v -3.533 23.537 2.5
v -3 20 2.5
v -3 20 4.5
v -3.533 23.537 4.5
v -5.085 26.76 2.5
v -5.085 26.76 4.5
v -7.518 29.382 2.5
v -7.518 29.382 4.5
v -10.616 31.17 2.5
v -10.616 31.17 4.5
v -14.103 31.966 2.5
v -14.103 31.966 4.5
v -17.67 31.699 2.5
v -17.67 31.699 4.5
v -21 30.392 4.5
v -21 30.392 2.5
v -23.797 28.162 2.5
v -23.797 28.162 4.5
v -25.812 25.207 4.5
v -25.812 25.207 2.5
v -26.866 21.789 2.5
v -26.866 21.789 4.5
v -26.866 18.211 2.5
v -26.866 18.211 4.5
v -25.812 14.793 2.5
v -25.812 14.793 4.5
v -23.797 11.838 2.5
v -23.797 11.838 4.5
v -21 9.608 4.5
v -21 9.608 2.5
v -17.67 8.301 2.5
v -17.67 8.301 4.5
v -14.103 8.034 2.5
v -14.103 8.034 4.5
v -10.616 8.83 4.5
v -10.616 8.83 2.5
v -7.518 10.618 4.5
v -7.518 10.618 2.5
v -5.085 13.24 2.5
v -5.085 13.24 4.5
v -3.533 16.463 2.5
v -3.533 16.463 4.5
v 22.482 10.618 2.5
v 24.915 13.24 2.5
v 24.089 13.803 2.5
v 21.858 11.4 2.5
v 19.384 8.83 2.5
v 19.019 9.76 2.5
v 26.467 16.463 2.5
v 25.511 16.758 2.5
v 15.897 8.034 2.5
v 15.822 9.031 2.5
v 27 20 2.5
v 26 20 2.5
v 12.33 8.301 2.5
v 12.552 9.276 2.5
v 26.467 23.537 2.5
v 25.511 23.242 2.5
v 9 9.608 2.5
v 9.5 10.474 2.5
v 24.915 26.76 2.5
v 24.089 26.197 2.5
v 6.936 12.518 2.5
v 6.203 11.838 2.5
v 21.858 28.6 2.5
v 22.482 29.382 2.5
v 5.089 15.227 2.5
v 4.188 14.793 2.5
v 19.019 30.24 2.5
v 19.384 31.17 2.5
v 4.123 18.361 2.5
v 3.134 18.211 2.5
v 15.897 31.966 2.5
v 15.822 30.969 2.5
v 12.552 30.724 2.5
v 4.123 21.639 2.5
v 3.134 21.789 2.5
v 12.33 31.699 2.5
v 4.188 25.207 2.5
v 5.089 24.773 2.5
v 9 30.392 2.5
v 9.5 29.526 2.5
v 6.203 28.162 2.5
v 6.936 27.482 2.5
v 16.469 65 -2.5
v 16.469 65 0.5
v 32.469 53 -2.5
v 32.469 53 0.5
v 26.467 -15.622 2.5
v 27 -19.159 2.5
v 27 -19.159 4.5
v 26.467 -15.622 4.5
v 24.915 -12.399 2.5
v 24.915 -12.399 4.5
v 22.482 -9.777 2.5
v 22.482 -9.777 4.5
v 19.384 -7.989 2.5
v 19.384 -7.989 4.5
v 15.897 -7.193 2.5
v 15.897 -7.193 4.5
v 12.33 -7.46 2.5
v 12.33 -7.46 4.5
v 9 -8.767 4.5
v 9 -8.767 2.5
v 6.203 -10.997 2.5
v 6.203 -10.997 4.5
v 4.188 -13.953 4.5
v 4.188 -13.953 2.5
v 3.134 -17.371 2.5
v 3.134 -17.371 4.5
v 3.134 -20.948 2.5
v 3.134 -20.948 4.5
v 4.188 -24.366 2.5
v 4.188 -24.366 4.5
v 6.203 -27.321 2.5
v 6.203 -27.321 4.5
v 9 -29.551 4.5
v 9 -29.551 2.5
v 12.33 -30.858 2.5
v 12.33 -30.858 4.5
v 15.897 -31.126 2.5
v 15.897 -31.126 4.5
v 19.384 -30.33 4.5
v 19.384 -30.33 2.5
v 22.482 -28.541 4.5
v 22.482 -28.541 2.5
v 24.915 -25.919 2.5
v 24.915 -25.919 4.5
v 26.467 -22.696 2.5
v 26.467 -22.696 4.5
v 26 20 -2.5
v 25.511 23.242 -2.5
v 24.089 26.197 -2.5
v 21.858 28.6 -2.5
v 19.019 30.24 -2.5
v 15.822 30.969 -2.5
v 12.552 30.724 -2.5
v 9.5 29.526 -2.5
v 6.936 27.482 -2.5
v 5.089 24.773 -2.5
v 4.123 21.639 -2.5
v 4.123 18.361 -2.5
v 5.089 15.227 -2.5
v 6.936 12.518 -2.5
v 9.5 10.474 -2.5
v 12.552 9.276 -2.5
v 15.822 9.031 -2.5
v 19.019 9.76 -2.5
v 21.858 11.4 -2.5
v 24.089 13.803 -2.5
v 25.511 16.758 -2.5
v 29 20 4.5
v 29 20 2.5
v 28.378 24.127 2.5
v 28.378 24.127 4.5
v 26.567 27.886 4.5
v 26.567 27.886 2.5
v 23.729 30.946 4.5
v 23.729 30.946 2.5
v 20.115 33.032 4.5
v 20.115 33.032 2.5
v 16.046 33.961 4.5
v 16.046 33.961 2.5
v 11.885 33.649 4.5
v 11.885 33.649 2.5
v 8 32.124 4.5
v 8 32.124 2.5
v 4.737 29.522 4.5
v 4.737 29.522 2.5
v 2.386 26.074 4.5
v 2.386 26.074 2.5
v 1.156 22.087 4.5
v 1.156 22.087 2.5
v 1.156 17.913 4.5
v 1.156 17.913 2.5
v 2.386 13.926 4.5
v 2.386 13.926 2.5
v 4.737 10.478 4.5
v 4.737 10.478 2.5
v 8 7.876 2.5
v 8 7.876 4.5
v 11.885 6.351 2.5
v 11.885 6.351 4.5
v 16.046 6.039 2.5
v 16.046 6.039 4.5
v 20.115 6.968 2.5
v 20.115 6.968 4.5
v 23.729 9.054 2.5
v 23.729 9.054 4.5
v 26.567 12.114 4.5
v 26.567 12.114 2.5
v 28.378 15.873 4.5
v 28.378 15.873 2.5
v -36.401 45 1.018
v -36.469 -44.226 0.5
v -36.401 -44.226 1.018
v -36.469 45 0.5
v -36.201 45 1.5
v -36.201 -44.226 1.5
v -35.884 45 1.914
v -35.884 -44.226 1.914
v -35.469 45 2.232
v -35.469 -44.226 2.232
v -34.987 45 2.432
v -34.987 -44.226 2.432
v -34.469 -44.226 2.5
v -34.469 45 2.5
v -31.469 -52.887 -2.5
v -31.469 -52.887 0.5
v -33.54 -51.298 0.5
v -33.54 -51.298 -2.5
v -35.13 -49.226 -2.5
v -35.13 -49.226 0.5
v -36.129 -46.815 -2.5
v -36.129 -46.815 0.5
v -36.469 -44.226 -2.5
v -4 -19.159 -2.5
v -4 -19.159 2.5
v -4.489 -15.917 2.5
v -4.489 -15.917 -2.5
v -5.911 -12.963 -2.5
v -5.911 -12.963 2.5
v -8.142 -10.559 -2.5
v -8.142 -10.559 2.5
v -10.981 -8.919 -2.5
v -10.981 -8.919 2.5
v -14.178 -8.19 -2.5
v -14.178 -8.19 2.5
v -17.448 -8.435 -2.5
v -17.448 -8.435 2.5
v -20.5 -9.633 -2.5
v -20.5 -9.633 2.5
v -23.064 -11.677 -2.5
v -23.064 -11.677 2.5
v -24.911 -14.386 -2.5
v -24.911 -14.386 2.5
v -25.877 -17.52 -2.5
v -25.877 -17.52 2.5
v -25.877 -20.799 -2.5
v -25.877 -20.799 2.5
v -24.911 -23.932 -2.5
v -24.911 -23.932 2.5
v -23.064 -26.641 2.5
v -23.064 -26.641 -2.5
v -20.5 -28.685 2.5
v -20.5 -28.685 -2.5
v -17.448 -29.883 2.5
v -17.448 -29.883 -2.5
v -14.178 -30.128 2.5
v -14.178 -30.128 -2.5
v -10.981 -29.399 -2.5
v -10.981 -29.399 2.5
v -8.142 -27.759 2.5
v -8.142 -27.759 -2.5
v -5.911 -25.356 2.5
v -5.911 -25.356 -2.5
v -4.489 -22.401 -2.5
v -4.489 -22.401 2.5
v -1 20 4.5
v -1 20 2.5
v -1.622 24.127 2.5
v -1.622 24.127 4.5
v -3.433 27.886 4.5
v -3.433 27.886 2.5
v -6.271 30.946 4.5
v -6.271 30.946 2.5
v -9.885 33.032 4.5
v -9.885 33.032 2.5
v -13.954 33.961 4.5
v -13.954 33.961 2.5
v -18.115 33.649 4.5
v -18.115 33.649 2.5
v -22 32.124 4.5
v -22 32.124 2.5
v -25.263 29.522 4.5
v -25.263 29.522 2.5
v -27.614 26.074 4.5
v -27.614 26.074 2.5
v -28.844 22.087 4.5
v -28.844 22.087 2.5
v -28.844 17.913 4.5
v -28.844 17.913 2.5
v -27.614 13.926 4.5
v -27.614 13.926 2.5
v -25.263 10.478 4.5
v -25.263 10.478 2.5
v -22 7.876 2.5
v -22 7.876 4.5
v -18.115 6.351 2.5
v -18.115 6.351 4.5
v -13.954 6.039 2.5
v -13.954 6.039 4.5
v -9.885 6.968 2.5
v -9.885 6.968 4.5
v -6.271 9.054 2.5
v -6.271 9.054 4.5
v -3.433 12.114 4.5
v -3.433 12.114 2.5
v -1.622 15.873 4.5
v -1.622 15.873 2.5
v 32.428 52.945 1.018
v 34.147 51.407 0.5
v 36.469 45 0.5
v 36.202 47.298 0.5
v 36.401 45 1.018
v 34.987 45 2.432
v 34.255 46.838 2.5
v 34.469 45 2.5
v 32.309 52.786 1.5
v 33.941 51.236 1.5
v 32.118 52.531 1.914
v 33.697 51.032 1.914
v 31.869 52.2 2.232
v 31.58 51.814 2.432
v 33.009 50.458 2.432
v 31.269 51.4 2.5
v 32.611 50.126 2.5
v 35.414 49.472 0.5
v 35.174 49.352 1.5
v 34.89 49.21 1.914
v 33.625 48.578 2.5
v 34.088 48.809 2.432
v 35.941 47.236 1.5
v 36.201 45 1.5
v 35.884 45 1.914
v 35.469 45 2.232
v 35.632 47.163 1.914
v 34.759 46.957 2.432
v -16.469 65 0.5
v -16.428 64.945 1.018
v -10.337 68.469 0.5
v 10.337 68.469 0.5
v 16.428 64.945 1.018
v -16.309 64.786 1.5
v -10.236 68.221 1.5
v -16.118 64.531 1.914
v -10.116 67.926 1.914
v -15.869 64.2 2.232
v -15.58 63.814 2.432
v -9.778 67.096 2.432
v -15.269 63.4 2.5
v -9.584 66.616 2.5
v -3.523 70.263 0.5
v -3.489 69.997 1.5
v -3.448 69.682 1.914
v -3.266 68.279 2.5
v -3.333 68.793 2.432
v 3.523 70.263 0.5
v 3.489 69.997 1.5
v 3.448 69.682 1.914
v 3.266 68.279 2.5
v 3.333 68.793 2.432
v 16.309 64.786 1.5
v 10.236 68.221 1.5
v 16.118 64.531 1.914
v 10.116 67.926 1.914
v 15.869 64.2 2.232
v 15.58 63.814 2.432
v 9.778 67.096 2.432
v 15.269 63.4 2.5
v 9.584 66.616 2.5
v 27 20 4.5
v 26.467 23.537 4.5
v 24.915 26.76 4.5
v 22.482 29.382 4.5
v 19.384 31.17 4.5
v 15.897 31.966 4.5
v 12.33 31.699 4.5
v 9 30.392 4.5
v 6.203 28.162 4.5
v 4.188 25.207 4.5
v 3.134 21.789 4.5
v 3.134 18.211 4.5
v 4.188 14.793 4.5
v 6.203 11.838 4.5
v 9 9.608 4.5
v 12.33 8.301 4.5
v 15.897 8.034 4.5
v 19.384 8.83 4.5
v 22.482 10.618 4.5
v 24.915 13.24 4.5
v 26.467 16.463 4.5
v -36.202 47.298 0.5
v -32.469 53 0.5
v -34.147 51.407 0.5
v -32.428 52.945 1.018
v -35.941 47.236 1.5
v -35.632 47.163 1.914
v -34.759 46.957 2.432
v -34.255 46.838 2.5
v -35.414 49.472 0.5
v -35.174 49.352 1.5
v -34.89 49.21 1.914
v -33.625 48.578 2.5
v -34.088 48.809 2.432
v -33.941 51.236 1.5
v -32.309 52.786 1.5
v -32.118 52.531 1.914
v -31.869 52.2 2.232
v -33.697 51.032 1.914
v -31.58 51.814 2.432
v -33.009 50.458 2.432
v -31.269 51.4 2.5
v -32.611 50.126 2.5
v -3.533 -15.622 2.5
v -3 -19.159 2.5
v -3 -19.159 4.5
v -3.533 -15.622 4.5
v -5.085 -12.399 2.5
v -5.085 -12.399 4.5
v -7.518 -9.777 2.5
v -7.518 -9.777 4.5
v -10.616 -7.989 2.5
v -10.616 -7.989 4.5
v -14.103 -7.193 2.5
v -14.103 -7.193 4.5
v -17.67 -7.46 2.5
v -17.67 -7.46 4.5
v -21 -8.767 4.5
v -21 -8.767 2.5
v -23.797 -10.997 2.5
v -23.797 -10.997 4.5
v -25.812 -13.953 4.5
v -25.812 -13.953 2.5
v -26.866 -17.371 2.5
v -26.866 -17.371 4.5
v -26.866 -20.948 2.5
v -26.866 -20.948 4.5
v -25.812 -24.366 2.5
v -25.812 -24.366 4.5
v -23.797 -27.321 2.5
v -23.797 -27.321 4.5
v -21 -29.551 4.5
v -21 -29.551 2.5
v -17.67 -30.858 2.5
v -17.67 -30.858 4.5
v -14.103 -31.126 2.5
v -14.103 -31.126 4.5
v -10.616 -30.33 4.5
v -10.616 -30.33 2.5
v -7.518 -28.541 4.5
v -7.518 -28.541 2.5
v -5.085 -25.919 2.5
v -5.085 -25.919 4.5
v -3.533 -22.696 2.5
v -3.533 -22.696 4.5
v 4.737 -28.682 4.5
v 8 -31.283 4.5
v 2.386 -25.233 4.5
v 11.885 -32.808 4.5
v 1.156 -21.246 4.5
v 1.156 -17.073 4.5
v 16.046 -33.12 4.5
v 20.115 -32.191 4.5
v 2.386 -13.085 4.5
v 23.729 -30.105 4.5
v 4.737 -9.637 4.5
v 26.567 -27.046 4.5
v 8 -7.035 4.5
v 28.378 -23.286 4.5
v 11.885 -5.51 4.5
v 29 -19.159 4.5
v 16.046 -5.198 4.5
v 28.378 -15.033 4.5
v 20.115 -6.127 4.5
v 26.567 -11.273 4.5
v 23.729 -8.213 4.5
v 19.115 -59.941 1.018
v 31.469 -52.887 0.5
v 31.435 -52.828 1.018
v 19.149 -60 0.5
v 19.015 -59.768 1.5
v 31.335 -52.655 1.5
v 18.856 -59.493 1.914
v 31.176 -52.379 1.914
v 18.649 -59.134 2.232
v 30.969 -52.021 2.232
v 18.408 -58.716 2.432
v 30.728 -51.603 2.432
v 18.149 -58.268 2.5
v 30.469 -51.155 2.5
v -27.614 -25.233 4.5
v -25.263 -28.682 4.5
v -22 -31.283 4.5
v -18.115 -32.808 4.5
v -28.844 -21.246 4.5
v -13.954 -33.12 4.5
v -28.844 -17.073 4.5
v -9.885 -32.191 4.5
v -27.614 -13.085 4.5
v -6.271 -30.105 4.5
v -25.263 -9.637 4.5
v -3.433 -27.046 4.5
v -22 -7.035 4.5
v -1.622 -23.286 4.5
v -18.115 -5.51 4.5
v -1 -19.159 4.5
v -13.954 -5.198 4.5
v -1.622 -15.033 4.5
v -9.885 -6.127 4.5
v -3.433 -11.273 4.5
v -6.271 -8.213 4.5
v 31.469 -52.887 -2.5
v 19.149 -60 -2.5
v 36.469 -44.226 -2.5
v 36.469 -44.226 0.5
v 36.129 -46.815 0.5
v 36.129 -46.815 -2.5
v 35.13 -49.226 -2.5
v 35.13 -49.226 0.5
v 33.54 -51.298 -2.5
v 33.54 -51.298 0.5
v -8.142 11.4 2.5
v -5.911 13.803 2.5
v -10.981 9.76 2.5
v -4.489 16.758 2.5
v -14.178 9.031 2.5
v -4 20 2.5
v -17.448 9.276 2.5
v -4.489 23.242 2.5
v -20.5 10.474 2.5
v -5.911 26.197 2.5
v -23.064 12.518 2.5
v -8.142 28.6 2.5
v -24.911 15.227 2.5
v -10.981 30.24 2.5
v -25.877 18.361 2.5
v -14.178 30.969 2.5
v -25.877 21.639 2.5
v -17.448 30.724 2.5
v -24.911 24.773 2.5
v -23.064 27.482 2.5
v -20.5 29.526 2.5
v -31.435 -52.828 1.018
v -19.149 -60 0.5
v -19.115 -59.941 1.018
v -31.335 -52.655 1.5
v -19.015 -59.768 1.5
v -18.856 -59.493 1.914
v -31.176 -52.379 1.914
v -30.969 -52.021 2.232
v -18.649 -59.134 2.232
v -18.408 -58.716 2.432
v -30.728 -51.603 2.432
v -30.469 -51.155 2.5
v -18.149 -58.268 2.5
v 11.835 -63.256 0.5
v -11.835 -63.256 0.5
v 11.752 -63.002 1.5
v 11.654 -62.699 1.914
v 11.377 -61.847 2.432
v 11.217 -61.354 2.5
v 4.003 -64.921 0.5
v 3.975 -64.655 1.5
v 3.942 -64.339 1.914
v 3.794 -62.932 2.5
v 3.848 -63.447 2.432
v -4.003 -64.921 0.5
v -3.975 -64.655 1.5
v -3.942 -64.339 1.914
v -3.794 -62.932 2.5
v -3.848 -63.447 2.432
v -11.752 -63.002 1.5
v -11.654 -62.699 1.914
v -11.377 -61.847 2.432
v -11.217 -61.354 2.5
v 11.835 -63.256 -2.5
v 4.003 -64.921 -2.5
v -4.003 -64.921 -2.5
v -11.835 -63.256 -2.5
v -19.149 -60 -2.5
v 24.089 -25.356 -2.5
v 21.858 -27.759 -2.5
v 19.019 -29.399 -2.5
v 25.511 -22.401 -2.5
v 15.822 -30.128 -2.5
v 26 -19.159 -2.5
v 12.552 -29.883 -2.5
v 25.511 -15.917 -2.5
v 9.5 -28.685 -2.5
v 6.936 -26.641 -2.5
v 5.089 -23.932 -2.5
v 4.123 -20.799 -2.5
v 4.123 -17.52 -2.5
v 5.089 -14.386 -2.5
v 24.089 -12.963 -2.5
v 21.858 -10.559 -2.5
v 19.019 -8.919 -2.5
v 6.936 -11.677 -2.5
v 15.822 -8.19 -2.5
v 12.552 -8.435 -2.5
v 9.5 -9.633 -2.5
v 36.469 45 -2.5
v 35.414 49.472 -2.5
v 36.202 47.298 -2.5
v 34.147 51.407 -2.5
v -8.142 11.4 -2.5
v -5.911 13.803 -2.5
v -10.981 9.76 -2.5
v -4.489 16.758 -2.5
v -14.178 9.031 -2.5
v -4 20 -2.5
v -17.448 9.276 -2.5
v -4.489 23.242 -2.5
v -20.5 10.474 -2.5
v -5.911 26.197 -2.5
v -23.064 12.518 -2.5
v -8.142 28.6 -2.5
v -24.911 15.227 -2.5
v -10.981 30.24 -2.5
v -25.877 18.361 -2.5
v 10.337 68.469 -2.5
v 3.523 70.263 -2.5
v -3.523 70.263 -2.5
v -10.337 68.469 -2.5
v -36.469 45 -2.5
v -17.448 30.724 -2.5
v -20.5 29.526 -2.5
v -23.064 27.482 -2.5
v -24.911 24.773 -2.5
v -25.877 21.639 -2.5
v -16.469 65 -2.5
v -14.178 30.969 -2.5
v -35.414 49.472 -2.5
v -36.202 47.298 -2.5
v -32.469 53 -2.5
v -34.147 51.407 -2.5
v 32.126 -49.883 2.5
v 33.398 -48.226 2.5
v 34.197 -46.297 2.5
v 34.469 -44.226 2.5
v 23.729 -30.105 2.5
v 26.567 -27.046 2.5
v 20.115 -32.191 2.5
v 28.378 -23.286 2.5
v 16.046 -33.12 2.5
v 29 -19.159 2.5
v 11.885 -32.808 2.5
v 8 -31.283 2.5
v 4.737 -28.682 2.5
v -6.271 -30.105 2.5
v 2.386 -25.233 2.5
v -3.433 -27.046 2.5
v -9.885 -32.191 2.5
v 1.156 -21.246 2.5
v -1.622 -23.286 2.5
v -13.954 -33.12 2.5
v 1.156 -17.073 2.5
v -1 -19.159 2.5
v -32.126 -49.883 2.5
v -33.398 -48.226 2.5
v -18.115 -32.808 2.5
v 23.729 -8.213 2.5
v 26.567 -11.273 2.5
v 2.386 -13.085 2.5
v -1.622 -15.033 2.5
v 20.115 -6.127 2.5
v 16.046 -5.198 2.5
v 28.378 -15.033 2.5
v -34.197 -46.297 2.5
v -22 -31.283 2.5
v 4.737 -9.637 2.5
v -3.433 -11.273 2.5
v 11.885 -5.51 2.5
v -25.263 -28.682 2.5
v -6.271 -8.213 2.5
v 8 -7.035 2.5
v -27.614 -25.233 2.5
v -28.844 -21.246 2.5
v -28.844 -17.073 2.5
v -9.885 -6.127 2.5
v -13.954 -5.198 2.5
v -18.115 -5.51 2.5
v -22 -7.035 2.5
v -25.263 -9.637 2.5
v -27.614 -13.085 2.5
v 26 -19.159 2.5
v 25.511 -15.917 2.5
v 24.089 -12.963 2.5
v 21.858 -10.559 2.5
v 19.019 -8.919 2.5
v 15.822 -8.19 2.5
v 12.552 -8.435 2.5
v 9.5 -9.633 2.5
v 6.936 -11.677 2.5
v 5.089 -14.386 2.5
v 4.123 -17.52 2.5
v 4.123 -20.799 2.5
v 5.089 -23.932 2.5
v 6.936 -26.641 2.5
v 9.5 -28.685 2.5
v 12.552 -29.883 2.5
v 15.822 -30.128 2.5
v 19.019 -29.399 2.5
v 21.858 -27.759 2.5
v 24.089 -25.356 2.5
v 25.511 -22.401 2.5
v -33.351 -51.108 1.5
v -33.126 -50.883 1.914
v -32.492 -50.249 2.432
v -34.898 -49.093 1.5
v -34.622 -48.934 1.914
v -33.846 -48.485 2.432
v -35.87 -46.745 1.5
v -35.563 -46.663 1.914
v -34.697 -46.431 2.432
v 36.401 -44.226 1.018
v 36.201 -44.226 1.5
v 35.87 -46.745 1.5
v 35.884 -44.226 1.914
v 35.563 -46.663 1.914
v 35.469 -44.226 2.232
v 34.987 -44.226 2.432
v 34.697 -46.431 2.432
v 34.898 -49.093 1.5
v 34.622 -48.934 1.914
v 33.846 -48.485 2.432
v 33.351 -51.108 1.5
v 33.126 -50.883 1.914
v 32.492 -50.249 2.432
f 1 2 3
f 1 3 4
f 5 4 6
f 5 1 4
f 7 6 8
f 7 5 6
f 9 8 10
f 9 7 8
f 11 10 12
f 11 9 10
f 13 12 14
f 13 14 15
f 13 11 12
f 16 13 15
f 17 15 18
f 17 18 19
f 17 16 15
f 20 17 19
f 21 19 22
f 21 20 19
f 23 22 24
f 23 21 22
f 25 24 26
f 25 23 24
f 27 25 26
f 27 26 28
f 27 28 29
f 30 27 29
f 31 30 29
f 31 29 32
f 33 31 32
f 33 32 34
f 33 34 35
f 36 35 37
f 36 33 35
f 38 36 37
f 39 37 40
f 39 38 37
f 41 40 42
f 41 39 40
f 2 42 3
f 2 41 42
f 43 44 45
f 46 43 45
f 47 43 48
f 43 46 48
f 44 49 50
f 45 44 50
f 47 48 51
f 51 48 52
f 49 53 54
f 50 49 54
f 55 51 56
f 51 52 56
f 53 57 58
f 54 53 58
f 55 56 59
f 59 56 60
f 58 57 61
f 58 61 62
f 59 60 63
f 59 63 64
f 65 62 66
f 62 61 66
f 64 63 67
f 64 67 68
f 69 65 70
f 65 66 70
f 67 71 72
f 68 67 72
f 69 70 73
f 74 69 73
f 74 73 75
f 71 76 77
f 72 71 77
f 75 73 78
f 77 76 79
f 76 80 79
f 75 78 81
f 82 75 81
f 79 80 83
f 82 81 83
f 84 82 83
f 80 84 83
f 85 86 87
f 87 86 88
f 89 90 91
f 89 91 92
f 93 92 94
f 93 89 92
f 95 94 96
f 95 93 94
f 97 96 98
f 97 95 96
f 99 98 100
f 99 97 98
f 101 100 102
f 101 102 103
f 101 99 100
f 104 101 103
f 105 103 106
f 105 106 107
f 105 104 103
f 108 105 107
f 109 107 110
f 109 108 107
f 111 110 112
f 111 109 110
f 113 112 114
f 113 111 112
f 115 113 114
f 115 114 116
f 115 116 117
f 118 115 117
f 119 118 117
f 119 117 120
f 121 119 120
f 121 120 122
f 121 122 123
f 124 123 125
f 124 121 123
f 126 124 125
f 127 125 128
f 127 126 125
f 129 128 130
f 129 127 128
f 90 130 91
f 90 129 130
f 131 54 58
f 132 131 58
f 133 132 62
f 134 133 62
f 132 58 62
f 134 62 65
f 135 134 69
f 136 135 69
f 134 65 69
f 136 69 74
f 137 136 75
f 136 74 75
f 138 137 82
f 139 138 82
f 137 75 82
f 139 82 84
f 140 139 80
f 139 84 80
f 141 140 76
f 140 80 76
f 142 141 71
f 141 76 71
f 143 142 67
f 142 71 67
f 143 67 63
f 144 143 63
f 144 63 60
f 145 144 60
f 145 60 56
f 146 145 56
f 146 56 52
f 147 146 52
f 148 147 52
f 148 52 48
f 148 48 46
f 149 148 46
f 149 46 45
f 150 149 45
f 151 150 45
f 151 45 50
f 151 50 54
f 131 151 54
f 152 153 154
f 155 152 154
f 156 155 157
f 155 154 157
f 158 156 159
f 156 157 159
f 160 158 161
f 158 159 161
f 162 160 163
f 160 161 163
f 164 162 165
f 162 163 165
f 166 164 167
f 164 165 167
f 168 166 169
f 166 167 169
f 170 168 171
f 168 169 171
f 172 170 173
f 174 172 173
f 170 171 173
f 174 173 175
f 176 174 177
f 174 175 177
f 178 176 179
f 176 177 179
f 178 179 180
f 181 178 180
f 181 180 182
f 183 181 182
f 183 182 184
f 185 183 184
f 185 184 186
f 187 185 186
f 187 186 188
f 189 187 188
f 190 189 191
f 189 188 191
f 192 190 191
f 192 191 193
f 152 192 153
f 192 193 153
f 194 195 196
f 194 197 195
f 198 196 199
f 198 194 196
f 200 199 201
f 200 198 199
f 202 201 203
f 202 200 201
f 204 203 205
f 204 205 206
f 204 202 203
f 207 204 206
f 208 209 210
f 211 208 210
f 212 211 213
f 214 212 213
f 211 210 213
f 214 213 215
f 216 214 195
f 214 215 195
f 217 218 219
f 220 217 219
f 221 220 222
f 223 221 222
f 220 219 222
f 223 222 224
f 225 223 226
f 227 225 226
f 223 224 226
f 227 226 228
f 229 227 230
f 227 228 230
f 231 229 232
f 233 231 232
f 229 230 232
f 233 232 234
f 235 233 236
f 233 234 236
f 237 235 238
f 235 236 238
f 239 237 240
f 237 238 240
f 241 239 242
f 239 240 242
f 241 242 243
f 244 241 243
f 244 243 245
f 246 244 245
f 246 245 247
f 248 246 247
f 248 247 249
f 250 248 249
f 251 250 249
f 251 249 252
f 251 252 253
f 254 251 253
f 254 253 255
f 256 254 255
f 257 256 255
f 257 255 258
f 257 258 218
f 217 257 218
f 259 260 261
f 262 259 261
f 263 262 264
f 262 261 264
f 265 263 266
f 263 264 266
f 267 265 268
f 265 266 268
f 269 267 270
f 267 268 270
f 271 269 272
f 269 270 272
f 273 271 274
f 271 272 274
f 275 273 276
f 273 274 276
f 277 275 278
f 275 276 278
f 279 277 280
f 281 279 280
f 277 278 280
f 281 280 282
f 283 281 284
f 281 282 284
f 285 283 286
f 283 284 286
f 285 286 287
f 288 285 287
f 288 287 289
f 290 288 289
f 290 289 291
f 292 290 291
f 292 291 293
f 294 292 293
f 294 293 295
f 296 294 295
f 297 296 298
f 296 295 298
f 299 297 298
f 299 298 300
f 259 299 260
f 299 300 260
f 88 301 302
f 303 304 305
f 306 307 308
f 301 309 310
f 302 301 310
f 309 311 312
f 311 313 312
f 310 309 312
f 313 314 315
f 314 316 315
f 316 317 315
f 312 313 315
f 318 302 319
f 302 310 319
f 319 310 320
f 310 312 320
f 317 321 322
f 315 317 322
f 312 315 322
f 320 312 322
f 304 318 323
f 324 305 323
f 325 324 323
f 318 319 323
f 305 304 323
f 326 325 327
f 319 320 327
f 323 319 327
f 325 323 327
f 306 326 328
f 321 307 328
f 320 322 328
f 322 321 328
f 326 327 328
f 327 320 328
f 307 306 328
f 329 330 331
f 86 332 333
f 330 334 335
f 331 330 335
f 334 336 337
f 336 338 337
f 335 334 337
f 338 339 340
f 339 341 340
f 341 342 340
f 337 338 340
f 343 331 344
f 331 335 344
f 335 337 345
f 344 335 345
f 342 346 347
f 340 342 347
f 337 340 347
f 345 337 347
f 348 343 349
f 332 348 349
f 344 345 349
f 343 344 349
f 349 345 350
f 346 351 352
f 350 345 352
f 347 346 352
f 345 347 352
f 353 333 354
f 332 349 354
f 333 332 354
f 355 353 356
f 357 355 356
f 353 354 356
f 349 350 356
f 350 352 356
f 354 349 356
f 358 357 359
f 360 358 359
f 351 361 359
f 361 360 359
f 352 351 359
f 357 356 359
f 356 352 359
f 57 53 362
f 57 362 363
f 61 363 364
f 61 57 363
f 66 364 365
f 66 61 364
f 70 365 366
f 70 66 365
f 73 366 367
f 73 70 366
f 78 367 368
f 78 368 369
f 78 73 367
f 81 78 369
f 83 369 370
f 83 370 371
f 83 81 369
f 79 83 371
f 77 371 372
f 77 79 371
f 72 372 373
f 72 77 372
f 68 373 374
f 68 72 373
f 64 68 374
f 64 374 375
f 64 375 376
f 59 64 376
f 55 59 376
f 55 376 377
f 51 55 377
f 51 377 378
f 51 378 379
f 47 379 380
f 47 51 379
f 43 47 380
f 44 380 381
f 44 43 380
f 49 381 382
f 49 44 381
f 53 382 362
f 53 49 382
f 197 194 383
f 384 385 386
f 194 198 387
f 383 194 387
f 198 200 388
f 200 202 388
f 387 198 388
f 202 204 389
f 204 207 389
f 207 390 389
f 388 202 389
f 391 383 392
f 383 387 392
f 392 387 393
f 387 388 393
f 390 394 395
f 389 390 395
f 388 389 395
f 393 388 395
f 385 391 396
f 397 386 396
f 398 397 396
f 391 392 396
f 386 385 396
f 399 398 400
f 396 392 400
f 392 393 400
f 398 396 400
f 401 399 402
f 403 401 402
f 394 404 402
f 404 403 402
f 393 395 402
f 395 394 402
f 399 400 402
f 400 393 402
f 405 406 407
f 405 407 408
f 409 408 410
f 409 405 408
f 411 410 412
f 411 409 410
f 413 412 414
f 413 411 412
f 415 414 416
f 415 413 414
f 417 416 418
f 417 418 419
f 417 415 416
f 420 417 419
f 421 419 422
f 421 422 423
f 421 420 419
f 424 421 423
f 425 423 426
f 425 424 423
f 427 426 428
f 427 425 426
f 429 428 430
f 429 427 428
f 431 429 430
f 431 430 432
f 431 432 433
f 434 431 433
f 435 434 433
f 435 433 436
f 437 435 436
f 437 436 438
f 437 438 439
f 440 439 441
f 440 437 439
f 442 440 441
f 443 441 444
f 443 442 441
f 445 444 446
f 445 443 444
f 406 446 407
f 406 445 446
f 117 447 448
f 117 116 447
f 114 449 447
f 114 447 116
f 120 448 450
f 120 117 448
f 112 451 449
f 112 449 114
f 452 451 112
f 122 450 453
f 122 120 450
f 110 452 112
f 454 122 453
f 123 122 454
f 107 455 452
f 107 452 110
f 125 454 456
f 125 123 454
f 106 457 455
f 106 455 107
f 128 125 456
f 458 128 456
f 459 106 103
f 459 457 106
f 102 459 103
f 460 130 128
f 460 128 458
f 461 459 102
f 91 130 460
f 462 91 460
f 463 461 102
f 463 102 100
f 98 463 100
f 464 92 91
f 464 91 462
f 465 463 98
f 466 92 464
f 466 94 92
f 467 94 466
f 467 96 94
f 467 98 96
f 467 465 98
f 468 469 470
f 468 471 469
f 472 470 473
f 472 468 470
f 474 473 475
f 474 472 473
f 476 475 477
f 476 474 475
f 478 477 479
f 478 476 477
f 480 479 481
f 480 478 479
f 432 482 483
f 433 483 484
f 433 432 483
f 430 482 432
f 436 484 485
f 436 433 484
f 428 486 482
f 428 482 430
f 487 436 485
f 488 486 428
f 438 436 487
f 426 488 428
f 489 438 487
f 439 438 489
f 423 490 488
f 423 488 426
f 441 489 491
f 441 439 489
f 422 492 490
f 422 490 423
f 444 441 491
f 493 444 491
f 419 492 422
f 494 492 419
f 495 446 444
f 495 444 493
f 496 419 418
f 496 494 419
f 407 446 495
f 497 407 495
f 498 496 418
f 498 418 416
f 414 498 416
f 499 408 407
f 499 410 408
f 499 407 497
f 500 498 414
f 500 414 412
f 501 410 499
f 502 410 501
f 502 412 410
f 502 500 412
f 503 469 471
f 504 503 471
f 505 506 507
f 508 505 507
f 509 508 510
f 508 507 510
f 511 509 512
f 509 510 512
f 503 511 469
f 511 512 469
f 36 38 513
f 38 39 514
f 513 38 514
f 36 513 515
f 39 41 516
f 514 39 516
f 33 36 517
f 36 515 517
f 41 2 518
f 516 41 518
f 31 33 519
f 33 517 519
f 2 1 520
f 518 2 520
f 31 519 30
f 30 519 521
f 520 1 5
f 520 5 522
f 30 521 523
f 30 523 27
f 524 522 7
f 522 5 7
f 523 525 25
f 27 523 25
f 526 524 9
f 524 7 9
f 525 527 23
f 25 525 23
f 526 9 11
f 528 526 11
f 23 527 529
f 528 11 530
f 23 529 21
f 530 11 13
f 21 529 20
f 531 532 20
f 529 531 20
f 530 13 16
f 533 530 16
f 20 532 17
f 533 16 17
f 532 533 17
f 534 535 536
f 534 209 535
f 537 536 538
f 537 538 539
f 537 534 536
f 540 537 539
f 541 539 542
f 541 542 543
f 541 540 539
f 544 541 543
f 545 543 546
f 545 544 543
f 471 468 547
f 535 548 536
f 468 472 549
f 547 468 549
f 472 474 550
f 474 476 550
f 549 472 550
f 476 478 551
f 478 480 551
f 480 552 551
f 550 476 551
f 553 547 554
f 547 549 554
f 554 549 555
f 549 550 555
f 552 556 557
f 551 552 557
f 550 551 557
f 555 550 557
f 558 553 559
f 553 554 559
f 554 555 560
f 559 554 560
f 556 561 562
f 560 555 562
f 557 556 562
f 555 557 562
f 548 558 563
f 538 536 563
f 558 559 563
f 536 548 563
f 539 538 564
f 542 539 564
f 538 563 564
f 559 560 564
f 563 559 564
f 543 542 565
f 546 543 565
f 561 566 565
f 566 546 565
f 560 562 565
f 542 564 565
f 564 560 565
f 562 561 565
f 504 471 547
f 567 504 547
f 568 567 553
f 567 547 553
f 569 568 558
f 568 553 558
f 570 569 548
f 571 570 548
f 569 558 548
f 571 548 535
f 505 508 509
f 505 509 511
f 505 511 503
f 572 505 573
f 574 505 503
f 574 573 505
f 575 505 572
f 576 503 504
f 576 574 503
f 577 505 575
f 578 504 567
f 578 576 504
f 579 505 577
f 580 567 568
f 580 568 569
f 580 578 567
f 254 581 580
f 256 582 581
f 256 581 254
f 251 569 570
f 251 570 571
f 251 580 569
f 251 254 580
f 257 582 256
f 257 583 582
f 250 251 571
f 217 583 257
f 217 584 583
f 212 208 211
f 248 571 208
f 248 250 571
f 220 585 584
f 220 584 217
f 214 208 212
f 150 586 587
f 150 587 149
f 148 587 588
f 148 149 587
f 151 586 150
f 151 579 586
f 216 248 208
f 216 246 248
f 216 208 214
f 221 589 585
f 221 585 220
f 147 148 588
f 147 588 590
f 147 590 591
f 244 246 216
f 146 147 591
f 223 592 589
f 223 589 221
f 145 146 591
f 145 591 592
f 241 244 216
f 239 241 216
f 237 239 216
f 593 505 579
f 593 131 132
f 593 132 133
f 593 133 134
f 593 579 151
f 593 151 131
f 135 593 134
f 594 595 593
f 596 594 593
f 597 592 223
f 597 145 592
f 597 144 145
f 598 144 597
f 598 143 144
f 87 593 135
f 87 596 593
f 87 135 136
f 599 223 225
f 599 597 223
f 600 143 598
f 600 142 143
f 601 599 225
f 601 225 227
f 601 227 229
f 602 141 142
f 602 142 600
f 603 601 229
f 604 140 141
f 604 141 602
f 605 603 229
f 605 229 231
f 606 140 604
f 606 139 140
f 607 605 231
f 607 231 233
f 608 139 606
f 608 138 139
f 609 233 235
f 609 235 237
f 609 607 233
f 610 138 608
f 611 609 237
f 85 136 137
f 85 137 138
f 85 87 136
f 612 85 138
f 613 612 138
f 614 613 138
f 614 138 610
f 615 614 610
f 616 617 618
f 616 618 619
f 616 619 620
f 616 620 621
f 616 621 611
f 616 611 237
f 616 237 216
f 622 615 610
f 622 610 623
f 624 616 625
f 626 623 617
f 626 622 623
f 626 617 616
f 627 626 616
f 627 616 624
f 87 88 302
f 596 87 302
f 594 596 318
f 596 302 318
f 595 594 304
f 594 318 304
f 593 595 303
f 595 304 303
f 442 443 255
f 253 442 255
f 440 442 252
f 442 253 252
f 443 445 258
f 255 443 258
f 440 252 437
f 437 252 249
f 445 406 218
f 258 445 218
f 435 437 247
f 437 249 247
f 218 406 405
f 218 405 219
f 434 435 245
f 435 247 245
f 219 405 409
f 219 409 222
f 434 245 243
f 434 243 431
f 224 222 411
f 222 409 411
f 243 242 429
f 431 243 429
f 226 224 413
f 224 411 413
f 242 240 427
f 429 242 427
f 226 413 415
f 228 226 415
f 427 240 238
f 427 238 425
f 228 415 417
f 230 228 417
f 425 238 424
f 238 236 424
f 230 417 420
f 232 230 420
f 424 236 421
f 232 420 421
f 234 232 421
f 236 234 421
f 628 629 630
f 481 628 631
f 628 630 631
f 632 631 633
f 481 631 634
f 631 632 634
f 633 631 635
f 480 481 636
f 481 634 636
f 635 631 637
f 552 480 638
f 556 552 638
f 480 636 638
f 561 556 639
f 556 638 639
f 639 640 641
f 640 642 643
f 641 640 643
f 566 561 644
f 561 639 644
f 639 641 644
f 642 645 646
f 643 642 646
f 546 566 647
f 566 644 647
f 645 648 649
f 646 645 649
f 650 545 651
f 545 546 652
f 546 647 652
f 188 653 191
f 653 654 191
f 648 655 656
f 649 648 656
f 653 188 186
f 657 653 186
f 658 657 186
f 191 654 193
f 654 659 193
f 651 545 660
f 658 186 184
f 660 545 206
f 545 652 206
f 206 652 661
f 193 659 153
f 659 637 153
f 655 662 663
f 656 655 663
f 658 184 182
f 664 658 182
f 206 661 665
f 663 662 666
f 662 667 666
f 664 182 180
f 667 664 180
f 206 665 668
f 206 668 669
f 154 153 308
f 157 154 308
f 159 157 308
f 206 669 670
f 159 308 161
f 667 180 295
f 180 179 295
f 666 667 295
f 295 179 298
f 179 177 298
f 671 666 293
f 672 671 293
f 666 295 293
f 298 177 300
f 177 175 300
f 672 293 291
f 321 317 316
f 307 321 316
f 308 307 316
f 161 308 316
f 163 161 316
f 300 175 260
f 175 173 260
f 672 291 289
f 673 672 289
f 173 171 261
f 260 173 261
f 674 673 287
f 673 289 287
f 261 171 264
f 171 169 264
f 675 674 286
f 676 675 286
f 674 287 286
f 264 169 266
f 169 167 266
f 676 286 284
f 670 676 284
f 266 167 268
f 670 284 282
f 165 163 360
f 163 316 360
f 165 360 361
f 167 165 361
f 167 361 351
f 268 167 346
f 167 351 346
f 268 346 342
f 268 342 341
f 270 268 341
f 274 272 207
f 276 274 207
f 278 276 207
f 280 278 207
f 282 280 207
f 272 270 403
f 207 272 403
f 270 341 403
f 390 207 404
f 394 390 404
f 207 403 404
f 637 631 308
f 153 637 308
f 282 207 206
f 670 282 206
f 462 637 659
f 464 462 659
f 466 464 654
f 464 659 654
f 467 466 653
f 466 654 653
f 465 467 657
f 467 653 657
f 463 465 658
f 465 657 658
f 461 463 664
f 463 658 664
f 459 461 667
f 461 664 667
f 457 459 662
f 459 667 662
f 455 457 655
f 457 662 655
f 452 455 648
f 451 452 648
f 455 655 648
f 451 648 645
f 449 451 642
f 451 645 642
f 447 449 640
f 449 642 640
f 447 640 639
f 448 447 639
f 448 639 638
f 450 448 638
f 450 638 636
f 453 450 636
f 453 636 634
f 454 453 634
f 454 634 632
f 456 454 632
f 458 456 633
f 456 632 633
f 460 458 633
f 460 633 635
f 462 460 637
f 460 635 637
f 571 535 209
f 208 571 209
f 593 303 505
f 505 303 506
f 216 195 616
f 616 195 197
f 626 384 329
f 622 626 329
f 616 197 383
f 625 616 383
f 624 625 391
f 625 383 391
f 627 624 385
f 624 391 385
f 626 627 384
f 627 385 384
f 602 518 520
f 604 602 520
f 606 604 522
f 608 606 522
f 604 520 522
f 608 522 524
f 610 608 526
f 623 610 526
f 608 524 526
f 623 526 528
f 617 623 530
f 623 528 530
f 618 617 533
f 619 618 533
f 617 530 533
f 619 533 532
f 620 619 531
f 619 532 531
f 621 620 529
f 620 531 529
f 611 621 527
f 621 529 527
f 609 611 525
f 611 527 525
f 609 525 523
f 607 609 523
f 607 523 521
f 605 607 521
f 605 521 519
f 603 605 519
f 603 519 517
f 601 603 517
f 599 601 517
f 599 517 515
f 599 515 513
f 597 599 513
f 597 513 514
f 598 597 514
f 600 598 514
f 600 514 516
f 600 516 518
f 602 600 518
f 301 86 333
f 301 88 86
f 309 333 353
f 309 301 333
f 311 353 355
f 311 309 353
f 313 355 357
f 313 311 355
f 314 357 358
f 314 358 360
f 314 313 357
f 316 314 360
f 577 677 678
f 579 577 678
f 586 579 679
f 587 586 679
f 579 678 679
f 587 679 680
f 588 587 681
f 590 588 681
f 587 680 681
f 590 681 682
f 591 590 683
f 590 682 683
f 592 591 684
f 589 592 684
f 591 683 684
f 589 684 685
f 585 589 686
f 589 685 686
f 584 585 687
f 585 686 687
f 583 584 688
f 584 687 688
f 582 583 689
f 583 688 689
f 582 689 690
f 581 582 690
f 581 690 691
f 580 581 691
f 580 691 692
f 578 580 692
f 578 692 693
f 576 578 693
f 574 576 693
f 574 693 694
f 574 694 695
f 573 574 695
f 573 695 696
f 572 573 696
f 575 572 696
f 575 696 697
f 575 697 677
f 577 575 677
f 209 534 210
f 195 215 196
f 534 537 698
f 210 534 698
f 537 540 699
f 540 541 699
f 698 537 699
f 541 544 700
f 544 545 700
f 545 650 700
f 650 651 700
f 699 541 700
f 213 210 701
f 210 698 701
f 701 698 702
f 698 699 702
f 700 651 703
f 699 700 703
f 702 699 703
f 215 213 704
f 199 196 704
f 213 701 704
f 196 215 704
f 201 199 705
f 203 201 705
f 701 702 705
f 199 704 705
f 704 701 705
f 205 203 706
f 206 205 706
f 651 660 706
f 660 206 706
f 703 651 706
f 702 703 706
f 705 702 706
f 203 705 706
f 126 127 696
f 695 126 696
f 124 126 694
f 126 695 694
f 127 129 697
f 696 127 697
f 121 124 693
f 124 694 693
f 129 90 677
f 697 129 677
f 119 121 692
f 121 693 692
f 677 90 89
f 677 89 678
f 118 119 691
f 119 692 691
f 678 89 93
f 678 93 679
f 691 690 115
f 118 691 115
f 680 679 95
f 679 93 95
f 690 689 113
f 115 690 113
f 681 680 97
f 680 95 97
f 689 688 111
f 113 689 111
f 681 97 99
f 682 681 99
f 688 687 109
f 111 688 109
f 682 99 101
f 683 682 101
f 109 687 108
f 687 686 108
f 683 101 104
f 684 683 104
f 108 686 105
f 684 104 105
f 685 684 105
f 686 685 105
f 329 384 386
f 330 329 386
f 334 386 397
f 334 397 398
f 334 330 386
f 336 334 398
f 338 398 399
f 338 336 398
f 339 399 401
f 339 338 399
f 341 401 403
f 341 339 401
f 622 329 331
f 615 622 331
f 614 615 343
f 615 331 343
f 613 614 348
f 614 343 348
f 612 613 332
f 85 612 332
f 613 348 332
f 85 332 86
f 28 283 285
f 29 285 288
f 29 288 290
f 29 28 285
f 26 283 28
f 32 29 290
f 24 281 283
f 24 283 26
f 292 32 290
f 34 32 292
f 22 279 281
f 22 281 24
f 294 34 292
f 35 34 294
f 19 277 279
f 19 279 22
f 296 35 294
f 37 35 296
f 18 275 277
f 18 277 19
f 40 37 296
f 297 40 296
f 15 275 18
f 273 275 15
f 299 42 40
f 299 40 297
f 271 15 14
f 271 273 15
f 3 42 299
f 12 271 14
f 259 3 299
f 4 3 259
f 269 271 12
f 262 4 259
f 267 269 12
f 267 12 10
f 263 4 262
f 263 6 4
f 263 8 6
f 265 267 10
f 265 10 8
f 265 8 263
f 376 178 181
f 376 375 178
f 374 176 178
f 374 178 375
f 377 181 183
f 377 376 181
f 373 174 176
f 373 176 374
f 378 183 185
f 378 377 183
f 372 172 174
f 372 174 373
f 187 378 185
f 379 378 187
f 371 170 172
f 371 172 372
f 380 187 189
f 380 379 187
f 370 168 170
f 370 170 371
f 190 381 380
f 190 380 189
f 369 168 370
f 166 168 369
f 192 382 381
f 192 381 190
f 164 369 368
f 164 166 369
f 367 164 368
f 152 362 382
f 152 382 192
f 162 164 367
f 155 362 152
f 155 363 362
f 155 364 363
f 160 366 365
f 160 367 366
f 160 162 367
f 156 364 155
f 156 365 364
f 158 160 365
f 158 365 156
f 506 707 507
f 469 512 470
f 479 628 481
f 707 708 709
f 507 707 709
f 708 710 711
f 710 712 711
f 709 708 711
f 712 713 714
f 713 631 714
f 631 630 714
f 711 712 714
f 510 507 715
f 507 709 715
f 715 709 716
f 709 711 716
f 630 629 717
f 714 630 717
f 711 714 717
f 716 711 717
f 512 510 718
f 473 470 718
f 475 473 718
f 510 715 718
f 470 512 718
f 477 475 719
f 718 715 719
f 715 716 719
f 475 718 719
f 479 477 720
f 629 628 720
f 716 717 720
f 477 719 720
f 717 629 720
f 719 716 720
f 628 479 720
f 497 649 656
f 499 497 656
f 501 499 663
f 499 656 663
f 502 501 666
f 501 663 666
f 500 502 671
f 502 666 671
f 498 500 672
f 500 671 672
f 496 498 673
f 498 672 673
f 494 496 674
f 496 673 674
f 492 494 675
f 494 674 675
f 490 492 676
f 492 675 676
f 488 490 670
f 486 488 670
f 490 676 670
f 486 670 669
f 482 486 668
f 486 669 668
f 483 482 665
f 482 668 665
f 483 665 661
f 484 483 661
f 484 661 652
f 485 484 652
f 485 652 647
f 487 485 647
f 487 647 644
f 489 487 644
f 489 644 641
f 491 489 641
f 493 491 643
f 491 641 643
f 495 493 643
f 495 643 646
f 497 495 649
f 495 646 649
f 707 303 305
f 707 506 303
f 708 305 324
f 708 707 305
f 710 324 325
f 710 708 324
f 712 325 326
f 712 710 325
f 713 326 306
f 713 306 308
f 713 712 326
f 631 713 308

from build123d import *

# Parameters (mm, degrees)
BOSS_EXTRUDE4_DEPTH = 2.5
SKETCH7_R           = 11
CUT_EXTRUDE1_DEPTH  = 6
SKETCH8_R           = 14
SKETCH8_R_2         = 12
BOSS_EXTRUDE5_DEPTH = 2
FILLET1_R           = 2


with BuildPart() as part:
    # Sketch6 → Boss-Extrude4 (new body, symmetric)
    with BuildSketch(Plane.XY):
        with BuildLine():
            Line((-32.469344609, 53), (-16.469344609, 65))
            ThreePointArc((-16.469344609, 65), (0, 70.489781536), (16.469344609, 65))
            Line((16.469344609, 65), (32.469344609, 53))
            ThreePointArc((32.469344609, 53), (35.413616519, 49.472135955), (36.469344609, 45))
            Line((36.469344609, 45), (36.469344609, -44.226497308))
            ThreePointArc((36.469344609, -44.226497308), (35.129598647, -49.226497308), (31.469344609, -52.886751346))
            Line((31.469344609, -52.886751346), (19.148836533, -60))
            ThreePointArc((19.148836533, -60), (0, -65.130915285), (-19.148836533, -60))
            Line((-19.148836533, -60), (-31.469344609, -52.886751346))
            ThreePointArc((-31.469344609, -52.886751346), (-35.129598647, -49.226497308), (-36.469344609, -44.226497308))
            Line((-36.469344609, -44.226497308), (-36.469344609, 45))
            ThreePointArc((-36.469344609, 45), (-35.413616519, 49.472135955), (-32.469344609, 53))
        make_face()
    extrude(amount=BOSS_EXTRUDE4_DEPTH, both=True)

    # Sketch7 → Cut-Extrude1 (cut, through all)
    with BuildSketch(Plane.XY.offset(2.5)):
        with Locations((15, -19.159106742)):
            Circle(SKETCH7_R)
        with Locations((-15, -19.159106742)):
            Circle(SKETCH7_R)
        with Locations((-15, 20)):
            Circle(SKETCH7_R)
        with Locations((15, 20)):
            Circle(SKETCH7_R)
    extrude(amount=-CUT_EXTRUDE1_DEPTH, mode=Mode.SUBTRACT)

    # Sketch8 → Boss-Extrude5 (add)
    with BuildSketch(Plane.XY.offset(2.5)):
        with Locations((15, -19.159106742)):
            Circle(SKETCH8_R)
        with Locations((15, -19.159106742)):
            Circle(SKETCH8_R_2, mode=Mode.SUBTRACT)
        with Locations((-15, 20)):
            Circle(SKETCH8_R)
        with Locations((-15, 20)):
            Circle(SKETCH8_R_2, mode=Mode.SUBTRACT)
        with Locations((15, 20)):
            Circle(SKETCH8_R)
        with Locations((15, 20)):
            Circle(SKETCH8_R_2, mode=Mode.SUBTRACT)
        with Locations((-15, -19.159106742)):
            Circle(SKETCH8_R)
        with Locations((-15, -19.159106742)):
            Circle(SKETCH8_R_2, mode=Mode.SUBTRACT)
    extrude(amount=BOSS_EXTRUDE5_DEPTH)

    # Fillet1
    fillet1_edges = [part.edges().sort_by_distance(p)[0] for p in [
        (-35.413616519, 49.472135955, 2.5),
        (-36.469344609, 0.386751346, 2.5),
        (-35.129598647, -49.226497308, 2.5),
        (-25.309090571, -56.443375673, 2.5),
        (0, -65.130915285, 2.5),
        (25.309090571, -56.443375673, 2.5),
        (35.129598647, -49.226497308, 2.5),
        (36.469344609, 0.386751346, 2.5),
        (35.413616519, 49.472135955, 2.5),
        (24.469344609, 59, 2.5),
        (0, 70.489781536, 2.5),
        (-24.469344609, 59, 2.5),
    ]]
    fillet(fillet1_edges, radius=FILLET1_R)


solid = part.part
